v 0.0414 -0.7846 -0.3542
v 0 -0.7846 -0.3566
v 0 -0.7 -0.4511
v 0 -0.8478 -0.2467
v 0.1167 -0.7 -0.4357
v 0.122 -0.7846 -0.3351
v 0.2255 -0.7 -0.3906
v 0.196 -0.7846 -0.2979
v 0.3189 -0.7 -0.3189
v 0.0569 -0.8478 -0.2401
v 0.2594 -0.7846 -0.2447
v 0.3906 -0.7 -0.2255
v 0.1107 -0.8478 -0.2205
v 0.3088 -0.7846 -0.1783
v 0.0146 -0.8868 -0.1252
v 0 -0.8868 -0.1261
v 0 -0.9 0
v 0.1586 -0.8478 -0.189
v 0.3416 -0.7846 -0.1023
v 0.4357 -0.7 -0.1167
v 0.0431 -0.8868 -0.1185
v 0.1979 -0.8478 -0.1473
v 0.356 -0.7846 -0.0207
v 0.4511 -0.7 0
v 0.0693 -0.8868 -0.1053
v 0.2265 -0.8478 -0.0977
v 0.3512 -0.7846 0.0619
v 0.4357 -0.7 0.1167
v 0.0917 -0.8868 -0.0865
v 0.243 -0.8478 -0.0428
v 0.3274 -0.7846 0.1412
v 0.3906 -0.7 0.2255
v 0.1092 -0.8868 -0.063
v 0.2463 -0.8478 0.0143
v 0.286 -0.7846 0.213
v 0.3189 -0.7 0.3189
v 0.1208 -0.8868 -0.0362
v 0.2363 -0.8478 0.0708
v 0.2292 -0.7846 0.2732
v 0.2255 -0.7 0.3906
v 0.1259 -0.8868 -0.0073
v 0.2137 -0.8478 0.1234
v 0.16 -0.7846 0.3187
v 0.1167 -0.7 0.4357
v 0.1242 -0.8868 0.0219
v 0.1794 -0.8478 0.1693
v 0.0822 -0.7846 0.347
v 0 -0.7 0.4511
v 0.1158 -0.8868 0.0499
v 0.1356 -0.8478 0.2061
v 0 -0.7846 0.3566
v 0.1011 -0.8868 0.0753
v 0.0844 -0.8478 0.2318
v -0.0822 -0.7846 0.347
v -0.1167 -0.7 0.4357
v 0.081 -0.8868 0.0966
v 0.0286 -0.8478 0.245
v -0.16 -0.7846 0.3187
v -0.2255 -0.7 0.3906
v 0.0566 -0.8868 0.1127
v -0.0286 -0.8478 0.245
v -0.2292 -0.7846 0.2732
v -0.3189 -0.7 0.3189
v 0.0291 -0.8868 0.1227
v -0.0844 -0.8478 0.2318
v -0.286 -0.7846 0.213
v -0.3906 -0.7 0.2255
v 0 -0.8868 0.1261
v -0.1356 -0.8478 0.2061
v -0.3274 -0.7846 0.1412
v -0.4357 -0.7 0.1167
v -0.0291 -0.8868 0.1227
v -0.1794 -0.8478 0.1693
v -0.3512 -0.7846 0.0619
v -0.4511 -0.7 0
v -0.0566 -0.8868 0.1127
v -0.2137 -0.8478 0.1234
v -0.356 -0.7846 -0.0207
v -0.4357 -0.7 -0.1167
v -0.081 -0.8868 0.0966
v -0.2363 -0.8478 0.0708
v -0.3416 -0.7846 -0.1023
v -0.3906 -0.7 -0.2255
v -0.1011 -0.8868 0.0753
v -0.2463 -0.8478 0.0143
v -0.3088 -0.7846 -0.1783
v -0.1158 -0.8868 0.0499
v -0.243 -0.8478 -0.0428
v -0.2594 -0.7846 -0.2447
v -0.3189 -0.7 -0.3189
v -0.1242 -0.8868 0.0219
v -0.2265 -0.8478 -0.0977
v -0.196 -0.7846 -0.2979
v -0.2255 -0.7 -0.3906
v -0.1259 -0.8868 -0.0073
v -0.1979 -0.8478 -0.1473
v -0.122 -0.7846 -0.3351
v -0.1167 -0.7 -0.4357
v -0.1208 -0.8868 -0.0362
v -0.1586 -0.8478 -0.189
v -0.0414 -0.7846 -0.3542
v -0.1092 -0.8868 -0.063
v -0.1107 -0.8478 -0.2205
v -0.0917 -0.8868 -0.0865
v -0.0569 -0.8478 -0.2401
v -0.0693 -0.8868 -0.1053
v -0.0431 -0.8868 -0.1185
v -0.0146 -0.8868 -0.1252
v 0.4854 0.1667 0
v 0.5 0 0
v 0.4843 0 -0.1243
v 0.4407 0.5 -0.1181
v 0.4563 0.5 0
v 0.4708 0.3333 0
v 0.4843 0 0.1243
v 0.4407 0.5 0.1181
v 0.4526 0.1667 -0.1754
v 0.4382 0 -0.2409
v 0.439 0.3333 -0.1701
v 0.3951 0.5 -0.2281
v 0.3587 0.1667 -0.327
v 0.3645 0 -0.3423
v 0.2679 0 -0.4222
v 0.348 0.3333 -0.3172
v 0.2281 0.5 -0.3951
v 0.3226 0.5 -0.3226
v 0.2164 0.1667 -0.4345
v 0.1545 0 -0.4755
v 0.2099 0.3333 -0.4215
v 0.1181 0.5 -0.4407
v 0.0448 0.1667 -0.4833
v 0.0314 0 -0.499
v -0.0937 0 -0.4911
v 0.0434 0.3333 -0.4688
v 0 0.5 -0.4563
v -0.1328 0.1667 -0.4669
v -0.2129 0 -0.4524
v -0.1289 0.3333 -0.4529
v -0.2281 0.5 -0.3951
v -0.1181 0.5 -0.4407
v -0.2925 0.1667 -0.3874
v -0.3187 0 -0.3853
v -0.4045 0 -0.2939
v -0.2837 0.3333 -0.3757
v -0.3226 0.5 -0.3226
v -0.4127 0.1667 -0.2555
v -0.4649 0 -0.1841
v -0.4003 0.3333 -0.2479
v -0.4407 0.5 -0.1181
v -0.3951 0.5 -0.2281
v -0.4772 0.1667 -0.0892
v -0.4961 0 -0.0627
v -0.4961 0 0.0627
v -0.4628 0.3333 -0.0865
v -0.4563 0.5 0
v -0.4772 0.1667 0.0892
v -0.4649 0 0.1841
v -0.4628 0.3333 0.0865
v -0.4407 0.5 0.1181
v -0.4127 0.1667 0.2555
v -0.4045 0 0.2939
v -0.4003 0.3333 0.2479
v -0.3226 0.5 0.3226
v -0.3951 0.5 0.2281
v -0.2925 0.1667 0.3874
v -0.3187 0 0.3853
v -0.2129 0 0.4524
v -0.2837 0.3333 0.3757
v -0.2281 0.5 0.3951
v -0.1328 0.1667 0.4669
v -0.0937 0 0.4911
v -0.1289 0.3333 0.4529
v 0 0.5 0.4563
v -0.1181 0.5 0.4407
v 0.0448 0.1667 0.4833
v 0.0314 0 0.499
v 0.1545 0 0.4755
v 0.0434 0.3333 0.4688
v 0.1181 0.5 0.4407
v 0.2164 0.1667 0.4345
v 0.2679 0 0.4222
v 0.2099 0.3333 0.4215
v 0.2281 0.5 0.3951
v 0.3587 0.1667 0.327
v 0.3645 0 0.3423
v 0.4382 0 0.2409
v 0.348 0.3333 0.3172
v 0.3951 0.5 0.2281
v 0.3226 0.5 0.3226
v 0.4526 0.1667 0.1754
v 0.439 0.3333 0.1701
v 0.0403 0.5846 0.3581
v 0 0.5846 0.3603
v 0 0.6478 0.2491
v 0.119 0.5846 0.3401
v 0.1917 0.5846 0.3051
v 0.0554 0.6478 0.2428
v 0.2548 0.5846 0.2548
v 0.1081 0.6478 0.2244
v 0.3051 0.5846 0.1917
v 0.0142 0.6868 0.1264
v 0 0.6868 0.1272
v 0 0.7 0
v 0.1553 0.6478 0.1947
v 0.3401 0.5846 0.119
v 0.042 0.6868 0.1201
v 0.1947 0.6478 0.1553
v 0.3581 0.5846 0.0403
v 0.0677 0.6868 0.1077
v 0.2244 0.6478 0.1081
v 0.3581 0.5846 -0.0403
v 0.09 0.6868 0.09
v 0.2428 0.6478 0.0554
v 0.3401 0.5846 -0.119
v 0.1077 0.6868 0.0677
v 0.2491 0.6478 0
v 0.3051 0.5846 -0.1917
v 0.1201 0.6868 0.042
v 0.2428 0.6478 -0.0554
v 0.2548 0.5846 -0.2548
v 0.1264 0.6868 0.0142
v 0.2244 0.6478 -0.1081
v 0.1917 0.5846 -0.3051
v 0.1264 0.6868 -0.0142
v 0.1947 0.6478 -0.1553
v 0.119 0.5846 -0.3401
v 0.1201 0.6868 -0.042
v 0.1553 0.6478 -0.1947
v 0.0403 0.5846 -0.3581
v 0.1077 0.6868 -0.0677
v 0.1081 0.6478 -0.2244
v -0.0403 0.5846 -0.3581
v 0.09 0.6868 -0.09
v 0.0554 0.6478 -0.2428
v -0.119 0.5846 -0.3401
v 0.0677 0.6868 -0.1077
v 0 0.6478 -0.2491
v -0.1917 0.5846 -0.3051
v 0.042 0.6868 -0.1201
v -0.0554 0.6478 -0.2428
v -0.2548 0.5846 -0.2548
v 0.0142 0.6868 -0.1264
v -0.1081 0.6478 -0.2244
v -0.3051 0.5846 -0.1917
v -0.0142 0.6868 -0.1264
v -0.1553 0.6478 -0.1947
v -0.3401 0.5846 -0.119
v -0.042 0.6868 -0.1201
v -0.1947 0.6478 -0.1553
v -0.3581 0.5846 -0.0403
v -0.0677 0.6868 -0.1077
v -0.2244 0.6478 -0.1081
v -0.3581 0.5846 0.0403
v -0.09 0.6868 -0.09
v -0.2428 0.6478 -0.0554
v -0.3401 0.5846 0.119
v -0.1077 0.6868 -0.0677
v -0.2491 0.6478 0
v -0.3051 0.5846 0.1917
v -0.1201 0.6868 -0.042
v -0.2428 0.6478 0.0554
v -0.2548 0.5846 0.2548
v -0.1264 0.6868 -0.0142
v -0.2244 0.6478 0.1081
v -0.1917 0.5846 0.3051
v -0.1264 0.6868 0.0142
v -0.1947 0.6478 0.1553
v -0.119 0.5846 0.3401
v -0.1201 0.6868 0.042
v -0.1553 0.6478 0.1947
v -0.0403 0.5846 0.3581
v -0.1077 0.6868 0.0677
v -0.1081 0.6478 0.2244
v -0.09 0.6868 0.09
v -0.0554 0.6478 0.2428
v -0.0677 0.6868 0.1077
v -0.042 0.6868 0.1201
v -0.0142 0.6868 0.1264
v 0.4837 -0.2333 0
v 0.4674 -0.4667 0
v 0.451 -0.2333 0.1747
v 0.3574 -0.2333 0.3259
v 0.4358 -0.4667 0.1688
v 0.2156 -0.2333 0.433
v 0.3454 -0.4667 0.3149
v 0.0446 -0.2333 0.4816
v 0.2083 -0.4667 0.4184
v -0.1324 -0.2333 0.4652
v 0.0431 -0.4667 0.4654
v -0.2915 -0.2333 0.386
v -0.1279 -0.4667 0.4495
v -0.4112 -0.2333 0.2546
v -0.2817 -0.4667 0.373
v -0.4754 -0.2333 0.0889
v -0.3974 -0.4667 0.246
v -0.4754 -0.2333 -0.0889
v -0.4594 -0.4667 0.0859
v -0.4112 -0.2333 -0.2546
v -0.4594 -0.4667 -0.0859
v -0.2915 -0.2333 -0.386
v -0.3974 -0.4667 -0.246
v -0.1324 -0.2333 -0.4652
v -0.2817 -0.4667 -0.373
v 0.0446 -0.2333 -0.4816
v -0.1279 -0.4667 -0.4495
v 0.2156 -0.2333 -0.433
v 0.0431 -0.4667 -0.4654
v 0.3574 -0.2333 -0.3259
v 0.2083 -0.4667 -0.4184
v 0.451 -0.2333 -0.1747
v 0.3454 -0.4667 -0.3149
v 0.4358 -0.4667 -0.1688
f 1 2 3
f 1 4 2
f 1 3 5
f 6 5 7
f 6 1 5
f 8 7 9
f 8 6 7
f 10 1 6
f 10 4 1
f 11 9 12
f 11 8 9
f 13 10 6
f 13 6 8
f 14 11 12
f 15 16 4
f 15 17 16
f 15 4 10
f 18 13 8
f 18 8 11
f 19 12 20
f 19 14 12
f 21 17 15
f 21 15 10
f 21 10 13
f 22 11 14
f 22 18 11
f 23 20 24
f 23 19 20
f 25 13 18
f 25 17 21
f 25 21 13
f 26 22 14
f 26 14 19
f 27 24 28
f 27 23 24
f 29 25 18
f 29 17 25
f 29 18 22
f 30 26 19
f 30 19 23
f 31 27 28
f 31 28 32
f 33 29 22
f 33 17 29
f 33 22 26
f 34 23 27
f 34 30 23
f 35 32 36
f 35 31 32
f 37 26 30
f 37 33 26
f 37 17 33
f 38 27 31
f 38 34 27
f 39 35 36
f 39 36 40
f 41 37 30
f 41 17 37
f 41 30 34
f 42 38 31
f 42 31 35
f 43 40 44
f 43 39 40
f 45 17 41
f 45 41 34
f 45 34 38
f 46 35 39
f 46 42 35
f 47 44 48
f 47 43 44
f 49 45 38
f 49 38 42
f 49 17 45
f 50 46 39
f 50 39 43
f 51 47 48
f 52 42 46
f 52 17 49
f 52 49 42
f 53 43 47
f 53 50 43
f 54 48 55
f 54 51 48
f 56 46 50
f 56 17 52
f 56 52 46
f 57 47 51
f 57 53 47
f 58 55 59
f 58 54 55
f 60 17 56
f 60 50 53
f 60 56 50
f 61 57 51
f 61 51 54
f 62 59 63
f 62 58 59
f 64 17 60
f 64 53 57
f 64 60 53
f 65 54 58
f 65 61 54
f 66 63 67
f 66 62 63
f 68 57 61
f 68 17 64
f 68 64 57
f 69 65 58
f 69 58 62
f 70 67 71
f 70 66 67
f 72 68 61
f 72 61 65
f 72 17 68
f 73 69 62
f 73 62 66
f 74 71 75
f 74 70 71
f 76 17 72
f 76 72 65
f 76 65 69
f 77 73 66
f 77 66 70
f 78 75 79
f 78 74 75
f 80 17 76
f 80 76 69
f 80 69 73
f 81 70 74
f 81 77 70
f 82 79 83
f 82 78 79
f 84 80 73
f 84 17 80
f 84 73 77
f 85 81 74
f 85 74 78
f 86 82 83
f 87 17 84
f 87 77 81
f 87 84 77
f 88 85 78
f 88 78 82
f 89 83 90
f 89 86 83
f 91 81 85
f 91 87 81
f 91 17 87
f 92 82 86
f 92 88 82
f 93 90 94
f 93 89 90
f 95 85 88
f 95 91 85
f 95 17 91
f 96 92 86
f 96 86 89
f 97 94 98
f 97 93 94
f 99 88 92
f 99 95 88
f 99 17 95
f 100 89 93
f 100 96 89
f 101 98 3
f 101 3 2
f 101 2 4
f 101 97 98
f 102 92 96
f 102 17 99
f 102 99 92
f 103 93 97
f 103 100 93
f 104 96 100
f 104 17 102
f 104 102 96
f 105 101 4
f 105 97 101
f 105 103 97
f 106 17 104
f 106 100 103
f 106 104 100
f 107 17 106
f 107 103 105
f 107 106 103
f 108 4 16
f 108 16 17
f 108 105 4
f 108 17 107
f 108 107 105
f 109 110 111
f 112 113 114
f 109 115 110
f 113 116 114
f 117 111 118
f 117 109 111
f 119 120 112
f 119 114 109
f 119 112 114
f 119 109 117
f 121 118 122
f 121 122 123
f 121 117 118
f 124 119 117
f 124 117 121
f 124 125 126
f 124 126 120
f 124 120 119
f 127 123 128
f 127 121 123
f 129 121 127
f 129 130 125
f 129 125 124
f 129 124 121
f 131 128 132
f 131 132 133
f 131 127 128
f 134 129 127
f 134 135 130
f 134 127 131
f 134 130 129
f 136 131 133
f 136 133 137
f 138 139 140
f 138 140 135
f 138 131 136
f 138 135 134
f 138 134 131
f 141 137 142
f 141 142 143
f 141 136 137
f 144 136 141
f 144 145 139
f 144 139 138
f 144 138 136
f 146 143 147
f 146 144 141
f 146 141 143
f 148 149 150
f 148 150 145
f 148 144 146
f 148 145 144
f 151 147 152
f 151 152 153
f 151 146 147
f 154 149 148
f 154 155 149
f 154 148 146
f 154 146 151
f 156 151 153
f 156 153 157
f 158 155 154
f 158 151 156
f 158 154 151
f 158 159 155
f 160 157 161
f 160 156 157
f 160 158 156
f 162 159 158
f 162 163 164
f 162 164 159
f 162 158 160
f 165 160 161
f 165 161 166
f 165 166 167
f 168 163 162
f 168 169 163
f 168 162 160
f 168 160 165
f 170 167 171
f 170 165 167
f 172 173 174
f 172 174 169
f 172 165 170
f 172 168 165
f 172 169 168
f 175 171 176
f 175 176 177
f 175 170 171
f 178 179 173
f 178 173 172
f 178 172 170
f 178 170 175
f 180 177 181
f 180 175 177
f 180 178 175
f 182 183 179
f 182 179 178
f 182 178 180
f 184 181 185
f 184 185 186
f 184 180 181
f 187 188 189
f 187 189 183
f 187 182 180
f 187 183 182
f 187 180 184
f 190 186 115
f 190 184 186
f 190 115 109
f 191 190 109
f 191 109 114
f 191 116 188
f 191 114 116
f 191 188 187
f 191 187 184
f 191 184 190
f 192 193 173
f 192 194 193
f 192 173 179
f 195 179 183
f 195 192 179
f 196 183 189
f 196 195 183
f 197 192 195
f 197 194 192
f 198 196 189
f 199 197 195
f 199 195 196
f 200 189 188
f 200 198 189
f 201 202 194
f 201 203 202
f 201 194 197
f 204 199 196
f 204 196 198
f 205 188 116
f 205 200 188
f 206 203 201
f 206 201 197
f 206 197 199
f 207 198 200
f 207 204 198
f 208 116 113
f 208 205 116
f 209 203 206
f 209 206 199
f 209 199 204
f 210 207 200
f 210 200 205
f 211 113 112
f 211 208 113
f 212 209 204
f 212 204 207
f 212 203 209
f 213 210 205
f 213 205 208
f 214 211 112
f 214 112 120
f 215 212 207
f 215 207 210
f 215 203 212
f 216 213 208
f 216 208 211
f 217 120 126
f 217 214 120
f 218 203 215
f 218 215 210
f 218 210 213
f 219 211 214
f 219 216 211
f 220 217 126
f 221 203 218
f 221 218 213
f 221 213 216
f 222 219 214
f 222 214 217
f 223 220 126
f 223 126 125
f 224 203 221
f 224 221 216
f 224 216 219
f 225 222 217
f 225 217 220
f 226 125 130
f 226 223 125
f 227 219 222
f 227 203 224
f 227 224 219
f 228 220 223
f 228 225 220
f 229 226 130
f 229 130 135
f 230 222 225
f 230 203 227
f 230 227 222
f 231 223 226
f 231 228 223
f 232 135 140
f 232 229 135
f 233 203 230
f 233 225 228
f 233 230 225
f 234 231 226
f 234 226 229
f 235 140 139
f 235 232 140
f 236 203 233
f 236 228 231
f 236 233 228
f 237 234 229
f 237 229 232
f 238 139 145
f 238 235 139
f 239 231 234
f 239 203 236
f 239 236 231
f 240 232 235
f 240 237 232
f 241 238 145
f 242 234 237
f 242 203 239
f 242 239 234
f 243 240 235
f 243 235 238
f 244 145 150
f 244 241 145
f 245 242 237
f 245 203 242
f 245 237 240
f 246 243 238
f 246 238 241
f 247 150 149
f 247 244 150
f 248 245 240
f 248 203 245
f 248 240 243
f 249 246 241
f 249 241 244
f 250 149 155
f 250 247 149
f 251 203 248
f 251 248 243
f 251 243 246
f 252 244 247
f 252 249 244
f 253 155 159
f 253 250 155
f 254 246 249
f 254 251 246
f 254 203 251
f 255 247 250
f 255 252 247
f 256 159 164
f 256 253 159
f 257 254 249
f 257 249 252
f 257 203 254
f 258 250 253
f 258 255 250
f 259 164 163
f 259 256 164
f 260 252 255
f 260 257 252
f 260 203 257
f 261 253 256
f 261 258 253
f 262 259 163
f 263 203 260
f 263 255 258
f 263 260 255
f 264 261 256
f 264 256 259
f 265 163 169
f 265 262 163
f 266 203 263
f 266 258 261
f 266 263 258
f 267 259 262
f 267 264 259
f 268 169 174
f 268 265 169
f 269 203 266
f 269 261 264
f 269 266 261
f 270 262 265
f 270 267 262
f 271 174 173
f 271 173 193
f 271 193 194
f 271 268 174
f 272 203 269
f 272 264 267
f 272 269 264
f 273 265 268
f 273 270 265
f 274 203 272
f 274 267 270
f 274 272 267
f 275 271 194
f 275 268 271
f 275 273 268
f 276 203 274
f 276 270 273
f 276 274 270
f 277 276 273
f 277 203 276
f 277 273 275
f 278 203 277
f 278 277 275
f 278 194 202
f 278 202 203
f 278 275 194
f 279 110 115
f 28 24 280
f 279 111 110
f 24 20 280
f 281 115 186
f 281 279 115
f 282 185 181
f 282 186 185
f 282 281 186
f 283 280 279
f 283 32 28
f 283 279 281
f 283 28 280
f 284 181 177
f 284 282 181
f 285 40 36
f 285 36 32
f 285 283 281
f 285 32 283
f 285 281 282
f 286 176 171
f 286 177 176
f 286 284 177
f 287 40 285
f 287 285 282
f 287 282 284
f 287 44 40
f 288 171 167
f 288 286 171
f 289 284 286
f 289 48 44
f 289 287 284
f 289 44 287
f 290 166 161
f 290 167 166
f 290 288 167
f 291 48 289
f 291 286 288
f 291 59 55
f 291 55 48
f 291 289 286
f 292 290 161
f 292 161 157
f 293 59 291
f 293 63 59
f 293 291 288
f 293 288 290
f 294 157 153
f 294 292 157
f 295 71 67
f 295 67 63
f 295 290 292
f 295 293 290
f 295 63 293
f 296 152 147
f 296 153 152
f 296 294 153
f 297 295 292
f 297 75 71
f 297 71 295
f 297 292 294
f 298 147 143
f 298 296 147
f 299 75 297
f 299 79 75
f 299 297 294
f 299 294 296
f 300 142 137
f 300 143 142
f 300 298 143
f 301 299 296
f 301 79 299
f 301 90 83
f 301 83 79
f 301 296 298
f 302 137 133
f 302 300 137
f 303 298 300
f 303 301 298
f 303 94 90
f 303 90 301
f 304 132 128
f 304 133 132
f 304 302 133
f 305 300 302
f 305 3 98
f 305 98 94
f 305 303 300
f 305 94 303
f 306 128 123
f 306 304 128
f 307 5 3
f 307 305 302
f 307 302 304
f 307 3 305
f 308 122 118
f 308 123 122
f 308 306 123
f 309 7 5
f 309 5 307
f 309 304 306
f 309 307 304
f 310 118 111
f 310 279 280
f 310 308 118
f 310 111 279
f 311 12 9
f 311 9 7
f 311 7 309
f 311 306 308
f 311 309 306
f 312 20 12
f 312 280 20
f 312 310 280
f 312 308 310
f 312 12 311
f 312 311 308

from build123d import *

# Parameters (mm, degrees)
SKETCH1_R           = 0.5
BOSS_EXTRUDE1_DEPTH = 0.5
BOSS_EXTRUDE1_TAPER = 5
DOME1_FACE_RADIUS   = 0.456255668
DOME1_HEIGHT        = 0.2
SKETCH2_R           = 0.5
BOSS_EXTRUDE2_DEPTH = 0.7
BOSS_EXTRUDE2_TAPER = 4
DOME3_FACE_RADIUS   = 0.451051232
DOME3_HEIGHT        = 0.2


with BuildPart() as part:
    # Sketch1 → Boss-Extrude1 (new body)
    with BuildSketch(Plane(origin=(0, 0, 0), x_dir=(1, 0, 0), z_dir=(0, 1, 0))):
        Circle(SKETCH1_R)
    extrude(amount=BOSS_EXTRUDE1_DEPTH, taper=BOSS_EXTRUDE1_TAPER)

    # Dome1: a dome of height H over a round flat face of radius A is a cap of a sphere of radius (A * A + H * H) / (2 * H)
    dome1_r = (DOME1_FACE_RADIUS * DOME1_FACE_RADIUS + DOME1_HEIGHT * DOME1_HEIGHT) / (2 * DOME1_HEIGHT)
    dome1_base = Plane((0, 0.5, 0), z_dir=(0, 1, 0))
    with Locations(dome1_base.offset(DOME1_HEIGHT - dome1_r)):
        dome1_ball = Sphere(dome1_r, mode=Mode.PRIVATE)
    add(split(dome1_ball, bisect_by=dome1_base, keep=Keep.TOP, mode=Mode.PRIVATE))

    # Sketch2 → Boss-Extrude2 (add)
    with BuildSketch(Plane.XZ):
        Circle(SKETCH2_R)
    extrude(amount=BOSS_EXTRUDE2_DEPTH, taper=BOSS_EXTRUDE2_TAPER)

    # Dome3: a dome of height H over a round flat face of radius A is a cap of a sphere of radius (A * A + H * H) / (2 * H)
    dome3_r = (DOME3_FACE_RADIUS * DOME3_FACE_RADIUS + DOME3_HEIGHT * DOME3_HEIGHT) / (2 * DOME3_HEIGHT)
    dome3_base = Plane((0, -0.7, 0), z_dir=(0, -1, 0))
    with Locations(dome3_base.offset(DOME3_HEIGHT - dome3_r)):
        dome3_ball = Sphere(dome3_r, mode=Mode.PRIVATE)
    add(split(dome3_ball, bisect_by=dome3_base, keep=Keep.TOP, mode=Mode.PRIVATE))


solid = part.part
